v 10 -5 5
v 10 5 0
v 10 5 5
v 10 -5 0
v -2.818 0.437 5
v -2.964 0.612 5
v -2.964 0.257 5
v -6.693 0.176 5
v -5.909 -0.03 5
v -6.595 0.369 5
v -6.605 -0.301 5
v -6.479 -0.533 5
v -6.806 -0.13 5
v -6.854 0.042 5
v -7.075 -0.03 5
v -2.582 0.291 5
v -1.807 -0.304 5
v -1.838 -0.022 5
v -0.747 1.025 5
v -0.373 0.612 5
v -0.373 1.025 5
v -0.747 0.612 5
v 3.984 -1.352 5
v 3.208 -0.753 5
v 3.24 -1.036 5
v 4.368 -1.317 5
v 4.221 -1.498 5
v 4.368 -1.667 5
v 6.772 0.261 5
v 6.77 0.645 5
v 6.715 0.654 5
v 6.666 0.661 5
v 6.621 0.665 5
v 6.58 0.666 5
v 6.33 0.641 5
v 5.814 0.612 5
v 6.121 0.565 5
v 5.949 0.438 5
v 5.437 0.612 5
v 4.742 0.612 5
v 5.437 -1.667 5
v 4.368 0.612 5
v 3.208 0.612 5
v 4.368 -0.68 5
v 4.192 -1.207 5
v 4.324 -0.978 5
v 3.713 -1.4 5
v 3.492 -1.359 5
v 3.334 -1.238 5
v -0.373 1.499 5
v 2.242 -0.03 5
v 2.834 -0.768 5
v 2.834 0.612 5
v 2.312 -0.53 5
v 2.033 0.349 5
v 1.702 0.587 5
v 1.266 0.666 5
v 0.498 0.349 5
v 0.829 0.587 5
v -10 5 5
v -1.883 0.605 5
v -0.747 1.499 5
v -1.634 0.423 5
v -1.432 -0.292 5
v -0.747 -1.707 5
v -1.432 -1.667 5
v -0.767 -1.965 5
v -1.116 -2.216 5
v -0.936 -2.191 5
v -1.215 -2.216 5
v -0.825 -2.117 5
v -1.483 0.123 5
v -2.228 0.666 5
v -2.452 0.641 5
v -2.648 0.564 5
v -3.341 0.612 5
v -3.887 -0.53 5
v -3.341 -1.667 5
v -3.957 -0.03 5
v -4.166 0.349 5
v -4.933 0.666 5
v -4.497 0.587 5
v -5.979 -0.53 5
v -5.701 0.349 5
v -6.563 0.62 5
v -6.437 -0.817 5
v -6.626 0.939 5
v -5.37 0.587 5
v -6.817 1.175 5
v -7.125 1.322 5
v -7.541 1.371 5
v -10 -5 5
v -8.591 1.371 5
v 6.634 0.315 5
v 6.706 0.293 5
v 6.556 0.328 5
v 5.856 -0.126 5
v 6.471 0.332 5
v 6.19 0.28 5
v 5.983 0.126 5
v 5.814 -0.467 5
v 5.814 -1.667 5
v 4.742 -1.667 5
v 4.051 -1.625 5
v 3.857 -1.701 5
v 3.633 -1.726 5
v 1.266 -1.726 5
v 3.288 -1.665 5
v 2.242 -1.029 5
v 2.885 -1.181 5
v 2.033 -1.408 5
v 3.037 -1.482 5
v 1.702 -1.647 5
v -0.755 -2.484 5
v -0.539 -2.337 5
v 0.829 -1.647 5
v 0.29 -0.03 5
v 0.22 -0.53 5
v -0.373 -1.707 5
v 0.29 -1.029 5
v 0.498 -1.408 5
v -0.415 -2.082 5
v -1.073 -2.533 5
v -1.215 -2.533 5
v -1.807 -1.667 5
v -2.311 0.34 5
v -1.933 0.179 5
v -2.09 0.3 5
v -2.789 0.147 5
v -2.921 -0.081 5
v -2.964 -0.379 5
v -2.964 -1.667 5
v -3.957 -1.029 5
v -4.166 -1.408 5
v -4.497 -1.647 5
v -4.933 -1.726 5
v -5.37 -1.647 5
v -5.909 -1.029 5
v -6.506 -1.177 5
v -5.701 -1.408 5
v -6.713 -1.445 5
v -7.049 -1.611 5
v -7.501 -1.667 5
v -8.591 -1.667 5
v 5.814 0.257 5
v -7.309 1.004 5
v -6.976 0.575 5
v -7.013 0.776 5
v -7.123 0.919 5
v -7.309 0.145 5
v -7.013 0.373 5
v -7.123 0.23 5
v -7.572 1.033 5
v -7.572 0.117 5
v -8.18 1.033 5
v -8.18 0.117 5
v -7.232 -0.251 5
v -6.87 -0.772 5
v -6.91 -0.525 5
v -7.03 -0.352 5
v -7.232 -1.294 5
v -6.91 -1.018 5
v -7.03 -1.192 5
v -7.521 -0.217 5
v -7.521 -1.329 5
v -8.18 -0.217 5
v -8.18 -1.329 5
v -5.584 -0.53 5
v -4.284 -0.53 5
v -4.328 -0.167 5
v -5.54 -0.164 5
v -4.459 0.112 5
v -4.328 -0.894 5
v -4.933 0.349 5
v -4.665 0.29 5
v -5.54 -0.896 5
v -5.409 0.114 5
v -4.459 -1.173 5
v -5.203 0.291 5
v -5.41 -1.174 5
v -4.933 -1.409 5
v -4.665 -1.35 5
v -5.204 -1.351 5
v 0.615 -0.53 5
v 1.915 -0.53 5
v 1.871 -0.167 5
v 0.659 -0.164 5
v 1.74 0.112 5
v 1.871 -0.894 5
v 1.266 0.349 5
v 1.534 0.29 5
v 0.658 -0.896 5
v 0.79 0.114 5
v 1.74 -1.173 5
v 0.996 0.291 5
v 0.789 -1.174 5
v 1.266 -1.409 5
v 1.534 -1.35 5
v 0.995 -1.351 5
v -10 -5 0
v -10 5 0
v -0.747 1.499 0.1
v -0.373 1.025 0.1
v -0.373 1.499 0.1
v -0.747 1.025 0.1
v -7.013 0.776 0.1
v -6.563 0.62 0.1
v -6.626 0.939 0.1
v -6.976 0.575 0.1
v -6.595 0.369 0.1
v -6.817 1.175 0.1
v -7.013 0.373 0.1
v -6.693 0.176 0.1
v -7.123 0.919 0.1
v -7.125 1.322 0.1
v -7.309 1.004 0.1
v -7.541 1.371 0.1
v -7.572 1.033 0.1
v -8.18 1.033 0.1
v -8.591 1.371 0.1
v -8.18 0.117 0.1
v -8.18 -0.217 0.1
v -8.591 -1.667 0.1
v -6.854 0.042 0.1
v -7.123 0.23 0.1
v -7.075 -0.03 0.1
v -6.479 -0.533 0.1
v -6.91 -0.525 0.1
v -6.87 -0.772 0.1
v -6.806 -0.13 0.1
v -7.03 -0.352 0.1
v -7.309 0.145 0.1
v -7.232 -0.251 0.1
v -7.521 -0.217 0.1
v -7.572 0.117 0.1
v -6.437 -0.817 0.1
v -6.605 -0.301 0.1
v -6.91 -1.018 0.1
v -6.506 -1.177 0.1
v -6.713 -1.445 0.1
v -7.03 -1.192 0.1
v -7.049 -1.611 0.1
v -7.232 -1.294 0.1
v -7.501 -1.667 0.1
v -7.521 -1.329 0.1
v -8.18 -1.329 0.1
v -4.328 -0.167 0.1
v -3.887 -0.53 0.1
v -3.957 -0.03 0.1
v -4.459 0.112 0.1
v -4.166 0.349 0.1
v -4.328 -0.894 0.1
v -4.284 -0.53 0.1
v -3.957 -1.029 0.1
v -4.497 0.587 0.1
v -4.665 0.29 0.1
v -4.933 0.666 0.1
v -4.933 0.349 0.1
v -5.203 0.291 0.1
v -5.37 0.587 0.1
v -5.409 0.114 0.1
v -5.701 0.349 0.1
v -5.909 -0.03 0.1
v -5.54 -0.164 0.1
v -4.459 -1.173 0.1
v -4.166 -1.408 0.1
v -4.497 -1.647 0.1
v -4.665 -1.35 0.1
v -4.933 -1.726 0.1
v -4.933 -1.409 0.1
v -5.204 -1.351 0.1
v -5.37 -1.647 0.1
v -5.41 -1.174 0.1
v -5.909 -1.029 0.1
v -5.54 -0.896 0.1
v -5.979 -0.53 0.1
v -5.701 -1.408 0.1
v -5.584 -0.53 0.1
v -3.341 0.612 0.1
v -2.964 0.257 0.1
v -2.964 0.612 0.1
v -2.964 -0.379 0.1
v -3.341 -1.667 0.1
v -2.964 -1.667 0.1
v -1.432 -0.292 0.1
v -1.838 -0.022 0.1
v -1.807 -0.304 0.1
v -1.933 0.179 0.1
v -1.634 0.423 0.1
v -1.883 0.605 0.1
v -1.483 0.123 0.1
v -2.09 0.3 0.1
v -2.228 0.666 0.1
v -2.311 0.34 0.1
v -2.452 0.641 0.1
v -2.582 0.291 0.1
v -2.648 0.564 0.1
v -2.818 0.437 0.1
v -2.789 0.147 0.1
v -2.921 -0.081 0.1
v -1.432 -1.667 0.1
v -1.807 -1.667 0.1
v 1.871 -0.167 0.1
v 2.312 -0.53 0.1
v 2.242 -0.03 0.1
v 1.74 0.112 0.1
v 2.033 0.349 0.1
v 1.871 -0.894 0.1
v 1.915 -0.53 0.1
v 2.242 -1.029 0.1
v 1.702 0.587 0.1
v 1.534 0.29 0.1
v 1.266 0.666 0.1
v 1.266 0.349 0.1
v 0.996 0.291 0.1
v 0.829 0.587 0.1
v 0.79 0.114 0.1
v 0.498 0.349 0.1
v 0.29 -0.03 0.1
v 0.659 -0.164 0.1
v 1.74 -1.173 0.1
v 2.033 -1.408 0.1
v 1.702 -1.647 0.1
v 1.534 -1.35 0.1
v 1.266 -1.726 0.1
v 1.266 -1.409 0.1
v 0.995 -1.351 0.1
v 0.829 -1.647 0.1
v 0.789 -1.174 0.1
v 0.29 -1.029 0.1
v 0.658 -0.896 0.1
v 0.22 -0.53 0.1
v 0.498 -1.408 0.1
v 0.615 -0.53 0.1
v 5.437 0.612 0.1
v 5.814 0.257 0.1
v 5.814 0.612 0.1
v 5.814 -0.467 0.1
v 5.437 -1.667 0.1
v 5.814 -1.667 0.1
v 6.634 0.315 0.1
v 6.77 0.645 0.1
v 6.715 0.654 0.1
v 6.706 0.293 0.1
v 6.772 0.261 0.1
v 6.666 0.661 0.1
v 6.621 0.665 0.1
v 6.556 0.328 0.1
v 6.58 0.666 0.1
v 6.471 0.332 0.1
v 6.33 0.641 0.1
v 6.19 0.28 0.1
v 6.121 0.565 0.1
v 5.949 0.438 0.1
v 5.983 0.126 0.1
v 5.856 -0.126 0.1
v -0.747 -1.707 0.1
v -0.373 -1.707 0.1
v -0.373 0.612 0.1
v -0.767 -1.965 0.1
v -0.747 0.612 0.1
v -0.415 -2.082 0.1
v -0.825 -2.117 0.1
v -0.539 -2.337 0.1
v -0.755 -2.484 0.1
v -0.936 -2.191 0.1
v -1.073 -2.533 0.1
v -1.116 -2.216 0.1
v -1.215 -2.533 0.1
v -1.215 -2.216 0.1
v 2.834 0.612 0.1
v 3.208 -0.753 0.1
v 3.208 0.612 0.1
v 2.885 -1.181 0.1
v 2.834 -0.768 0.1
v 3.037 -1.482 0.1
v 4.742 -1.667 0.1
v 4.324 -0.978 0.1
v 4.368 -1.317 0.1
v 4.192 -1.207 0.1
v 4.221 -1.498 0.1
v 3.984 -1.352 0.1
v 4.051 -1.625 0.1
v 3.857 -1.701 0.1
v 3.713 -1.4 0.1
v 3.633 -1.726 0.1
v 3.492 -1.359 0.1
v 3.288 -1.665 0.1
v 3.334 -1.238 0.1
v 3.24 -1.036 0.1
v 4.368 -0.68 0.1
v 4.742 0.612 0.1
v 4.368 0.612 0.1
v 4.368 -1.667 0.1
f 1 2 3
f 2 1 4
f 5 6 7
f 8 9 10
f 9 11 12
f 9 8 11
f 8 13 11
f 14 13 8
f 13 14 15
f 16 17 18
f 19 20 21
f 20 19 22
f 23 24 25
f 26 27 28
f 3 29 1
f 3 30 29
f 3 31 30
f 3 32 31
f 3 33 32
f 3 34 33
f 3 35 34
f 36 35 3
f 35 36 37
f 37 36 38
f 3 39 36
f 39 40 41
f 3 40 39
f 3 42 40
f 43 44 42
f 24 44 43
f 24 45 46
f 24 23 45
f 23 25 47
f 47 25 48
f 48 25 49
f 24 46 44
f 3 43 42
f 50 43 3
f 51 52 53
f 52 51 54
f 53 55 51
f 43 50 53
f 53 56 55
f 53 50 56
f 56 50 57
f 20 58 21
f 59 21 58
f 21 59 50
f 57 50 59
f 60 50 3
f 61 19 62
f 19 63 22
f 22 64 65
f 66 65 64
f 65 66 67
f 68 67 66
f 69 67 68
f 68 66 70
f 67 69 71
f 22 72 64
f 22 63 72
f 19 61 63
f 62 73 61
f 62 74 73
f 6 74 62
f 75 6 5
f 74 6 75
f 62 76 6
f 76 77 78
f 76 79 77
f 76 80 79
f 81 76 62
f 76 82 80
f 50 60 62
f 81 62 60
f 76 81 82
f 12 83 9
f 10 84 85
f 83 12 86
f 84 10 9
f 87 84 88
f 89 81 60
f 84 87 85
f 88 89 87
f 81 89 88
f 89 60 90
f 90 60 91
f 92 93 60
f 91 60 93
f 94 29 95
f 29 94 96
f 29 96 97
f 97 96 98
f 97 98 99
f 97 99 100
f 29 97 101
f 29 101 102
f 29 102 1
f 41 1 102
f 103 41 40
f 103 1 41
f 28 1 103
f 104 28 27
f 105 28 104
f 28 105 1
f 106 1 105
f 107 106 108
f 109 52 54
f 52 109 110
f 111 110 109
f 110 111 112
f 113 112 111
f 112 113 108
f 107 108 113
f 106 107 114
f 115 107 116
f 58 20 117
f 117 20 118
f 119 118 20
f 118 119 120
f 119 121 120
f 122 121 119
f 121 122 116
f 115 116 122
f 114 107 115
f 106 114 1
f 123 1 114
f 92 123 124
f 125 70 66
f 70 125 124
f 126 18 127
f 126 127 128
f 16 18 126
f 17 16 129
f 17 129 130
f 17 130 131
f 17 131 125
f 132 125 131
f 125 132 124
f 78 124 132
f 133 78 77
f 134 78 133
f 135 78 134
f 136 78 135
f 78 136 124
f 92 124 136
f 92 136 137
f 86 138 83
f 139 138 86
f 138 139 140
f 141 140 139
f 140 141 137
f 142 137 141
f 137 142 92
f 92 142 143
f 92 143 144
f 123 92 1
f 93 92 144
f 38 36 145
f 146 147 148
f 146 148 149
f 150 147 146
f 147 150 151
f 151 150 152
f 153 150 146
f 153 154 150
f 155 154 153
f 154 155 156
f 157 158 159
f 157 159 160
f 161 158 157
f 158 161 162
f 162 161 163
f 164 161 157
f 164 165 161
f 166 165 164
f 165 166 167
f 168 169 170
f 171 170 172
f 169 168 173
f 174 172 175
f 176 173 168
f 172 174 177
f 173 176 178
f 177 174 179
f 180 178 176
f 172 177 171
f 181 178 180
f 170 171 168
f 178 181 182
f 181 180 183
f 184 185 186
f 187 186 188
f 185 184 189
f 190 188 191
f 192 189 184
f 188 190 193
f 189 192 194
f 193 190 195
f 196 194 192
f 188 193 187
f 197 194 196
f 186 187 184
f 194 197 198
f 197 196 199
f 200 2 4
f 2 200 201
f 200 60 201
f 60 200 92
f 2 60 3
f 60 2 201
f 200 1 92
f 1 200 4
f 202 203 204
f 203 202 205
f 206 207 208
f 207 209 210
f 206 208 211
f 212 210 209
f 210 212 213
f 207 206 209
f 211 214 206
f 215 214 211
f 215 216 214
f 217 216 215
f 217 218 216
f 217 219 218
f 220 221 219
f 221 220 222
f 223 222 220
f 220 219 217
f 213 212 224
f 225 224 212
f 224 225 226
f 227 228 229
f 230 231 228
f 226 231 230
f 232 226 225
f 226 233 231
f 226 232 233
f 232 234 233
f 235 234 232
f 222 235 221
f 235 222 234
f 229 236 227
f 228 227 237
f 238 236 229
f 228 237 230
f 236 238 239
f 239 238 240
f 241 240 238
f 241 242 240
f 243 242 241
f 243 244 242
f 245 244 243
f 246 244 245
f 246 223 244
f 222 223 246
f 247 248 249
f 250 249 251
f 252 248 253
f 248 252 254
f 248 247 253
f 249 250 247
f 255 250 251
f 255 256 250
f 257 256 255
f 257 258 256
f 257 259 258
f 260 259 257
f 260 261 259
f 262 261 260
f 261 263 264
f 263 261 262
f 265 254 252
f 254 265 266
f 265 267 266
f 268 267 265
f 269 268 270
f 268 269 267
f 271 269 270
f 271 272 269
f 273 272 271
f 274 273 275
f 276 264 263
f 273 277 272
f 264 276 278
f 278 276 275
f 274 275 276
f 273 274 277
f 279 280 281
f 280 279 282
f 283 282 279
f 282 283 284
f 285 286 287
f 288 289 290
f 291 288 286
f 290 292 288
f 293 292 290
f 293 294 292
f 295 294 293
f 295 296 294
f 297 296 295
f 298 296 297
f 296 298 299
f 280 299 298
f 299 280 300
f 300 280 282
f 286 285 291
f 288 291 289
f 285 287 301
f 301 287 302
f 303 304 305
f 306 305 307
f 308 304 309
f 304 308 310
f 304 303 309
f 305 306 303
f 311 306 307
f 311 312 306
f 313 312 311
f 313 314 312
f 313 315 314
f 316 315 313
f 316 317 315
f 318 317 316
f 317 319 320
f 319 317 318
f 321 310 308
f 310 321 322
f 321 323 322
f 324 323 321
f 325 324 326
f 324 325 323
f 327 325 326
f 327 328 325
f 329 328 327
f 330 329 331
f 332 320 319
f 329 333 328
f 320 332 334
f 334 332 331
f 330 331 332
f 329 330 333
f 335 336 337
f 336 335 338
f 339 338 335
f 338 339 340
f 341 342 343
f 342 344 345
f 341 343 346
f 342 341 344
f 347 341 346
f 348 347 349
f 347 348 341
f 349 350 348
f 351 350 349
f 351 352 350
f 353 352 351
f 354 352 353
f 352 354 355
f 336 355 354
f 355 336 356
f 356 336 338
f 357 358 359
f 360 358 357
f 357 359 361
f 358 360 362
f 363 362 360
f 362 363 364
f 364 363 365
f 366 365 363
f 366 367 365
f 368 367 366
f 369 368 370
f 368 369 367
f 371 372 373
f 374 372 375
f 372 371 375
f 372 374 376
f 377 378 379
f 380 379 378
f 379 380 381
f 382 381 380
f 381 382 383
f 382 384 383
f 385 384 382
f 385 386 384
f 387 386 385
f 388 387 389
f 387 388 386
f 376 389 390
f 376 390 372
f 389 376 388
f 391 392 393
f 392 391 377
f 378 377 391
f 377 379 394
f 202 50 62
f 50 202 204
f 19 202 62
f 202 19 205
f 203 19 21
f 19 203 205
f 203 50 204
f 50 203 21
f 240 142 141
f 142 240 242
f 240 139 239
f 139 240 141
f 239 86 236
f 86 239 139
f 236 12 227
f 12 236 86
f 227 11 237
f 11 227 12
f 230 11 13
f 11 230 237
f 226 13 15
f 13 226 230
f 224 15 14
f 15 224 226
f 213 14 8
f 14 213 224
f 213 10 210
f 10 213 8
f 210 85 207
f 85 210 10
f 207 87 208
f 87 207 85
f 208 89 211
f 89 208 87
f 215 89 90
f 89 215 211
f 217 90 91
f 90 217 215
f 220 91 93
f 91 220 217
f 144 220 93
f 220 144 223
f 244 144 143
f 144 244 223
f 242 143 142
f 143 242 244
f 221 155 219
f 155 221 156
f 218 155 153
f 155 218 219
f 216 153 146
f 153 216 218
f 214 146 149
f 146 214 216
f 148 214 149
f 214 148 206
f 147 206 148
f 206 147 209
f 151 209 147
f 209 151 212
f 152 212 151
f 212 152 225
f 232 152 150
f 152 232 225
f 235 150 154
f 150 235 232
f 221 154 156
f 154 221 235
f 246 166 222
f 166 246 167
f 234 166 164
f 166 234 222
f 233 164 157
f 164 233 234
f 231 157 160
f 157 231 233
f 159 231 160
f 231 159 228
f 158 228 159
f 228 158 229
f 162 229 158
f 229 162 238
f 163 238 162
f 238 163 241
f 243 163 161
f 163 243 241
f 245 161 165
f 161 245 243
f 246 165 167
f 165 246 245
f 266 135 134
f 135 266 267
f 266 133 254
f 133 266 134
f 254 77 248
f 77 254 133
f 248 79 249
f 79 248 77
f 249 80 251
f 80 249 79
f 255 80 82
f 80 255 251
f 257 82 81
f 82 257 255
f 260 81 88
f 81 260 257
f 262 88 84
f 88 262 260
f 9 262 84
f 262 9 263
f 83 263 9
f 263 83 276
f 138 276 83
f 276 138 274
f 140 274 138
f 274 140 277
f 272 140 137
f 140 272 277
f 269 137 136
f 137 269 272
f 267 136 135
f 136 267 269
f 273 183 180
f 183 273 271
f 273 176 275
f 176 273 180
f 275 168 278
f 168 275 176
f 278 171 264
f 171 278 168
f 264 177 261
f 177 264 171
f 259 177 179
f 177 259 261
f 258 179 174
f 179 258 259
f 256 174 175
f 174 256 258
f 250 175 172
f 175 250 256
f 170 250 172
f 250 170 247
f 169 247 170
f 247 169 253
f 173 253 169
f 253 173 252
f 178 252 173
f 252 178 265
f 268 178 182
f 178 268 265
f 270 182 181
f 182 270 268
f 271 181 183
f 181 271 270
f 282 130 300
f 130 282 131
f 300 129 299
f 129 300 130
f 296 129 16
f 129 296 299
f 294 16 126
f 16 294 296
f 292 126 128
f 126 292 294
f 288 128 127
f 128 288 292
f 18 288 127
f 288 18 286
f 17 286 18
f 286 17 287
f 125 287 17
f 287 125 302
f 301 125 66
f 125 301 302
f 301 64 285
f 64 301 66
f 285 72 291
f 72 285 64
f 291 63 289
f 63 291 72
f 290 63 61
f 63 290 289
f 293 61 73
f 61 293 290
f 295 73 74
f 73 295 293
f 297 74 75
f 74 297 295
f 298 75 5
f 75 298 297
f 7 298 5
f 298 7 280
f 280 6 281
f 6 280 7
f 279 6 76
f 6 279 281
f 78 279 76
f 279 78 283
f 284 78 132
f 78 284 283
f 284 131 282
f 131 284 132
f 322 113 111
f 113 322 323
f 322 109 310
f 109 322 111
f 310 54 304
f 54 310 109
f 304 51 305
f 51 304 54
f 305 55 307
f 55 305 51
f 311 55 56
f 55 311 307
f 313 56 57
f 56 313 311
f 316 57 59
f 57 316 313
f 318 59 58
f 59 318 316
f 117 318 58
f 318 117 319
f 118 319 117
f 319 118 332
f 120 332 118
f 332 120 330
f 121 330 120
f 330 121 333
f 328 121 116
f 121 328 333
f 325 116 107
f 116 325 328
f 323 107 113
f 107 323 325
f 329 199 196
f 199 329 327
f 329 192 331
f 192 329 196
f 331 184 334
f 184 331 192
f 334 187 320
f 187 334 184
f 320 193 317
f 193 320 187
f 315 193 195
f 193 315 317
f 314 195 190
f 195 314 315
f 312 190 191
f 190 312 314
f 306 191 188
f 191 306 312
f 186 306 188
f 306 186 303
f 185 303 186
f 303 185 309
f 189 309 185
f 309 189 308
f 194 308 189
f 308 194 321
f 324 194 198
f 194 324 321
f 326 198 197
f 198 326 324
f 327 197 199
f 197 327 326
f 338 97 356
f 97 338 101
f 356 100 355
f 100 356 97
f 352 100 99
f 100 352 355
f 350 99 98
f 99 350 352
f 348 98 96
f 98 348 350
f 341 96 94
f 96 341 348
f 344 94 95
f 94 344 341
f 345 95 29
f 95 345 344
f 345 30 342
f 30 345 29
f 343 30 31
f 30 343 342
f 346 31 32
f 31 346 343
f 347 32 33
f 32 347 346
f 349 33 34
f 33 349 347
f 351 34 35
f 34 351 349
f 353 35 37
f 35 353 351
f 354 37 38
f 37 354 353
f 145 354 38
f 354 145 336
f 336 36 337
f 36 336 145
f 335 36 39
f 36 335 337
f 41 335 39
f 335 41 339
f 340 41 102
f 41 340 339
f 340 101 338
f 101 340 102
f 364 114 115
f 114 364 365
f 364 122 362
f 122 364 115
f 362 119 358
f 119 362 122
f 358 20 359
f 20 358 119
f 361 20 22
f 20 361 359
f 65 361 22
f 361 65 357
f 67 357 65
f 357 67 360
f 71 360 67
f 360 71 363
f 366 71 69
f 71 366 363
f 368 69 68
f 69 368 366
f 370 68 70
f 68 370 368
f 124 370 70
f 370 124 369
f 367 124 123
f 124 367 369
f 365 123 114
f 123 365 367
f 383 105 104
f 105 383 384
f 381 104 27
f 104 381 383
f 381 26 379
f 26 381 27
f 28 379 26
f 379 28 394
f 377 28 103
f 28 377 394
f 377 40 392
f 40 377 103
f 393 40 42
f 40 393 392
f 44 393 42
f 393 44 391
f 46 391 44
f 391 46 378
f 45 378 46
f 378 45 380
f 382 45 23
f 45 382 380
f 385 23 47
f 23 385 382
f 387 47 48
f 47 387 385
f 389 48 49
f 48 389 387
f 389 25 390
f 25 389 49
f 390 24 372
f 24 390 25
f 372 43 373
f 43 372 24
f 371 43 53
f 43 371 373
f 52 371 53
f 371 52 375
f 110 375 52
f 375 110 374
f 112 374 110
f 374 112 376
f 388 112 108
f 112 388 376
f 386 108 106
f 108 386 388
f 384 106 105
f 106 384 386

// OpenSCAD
$fn = 10; 
texte_a_inserer = "Bonjour"; 
taille = 3; 
police = "DejaVuSans"; //[[Abril Fatface,Aclonica,Acme,Advent Pro,Akronim,Aladin,Alegreya,Alegreya Sans,Alegreya SC,Alex Brush,Alfa Slab One,Alice,Amaranth,Architects Daughter,Archivo Black,Archivo Narrow,Arimo,Arvo,Asap,Astloch,Asul,Averia Libre,Averia Serif Libre,Bangers,Basic,Belgrano,Berkshire Swash,Bigshot One,Bilbo Swash Caps,Black Ops One,Bonbon,Bowlby One SC,Brawler,Bubblegum Sans,Butterfly Kids,Cabin Condensed,Caesar Dressing,Cagliostro,Calligraffitti,Capriola,Carter One,Changa One,Chango,Chelsea Market,Cherry Cream Soda,Chewy,Chicle,Chivo,Clicker Script,Coming Soon,Concert One,Condiment,Cookie,Courgette,Covered By Your Grace,Crimson Text,Dancing Script,DejaVu Sans,DejaVu Serif,Dhurjati,Doppio One,Dosis,Droid Sans,Eagle Lake,Electrolize,Emilys Candy,Encode Sans,Encode Sans Compressed,Euphoria Script,Exo,Exo 2,Faster One,Federo,Finger Paint,Fjord One,Fontdiner Swanky,Freckle Face,Fruktur,Gabriela,Geo,Germania One,Give You Glory,Gloria Hallelujah,Goudy Bookletter 1911,Graduate,Grand Hotel,Great Vibes,Griffy,Hanalei Fill,Happy Monkey,Henny Penny,Hind,IM Fell English SC,Indie Flower,Irish Grover,Italianno,Jacques Francois Shadow,Jolly Lodger,Josefin Slab,Joti One,Judson,Just Another Hand,Kalam,Kameron,Karma,Kavoon,Knewave,Kranky,Kristi,Laila,Lakki Reddy,Lancelot,Lato,Leckerli One,Ledger,Lekton,Lemon One,Liberation Sans,Libre Caslon Text,Life Savers,Lilita One,Lily Script One,Limelight,Lobster,Lobster Two,Londrina Outline,Londrina Shadow,Londrina Solid,Lora,Love Ya Like A Sister,Loved by the King,Lovers Quarrel,Luckiest Guy,Lusitana,Macondo,Macondo Swash Caps,Mako,Marck Script,Margarine,Marko One,Maven Pro,McLaren,MedievalSharp,Merienda One,Merriweather,Mervale Script,Metal Mania,Metrophobic,Milonga,Miltonian Tattoo,Miss Fajardose,Molle,Montez,Montserrat,Mr De Haviland,Mystery Quest,Neucha,New Rocker,Niconne,Nosifer,Nothing You Could Do,Noto Sans Oriya,Noto Serif,Nova Square,Nunito,Old Standard TT,Oleo Script,Oleo Script Swash Caps,Orbitron,Oregano,Orienta,Original Surfer,Oswald,Over the Rainbow,Overlock,Oxygen,Pacifico,Paprika,Parisienne,Patrick Hand SC,Paytone One,Peralta,Permanent Marker,Piedra,Pirata One,Play,Playball,Poetsen One,Poppins,Press Start 2P,Princess Sofia,PT Mono,Qwigley,Racing Sans One,Raleway,Rancho,Ranga,Ribeye,Roboto,Roboto Condensed,Roboto Slab,Rochester,Rock Salt,Rubik One,Sail,Salsa,Sansita One,Sarina,Satisfy,Schoolbell,Seaweed Script,Sevillana,Shadows Into Light,Shadows Into Light Two,Share,Six Caps,Skranji,Source Sans Pro,Spicy Rice,Stardos Stencil,Stoke,Syncopate,Teko,Terminal Dosis,The Girl Next Door,Tillana,Timmana,Titillium Web,Ubuntu,Ultra,Underdog,UnifrakturCook,UnifrakturMaguntia,Vampiro One,Vidaloka,Viga,Voces,Volkhov,Vollkorn,Voltaire,Waiting for the Sunrise,Wallpoet,Wellfleet,Wendy One,Yellowtail,Yesteryear,Zeyada]]
hauteur = 5; 
longueur_cube = 20; 
largeur_cube = 10; 
hauteur_cube = 5; 
// relief = true  extrusion = false
relief = "true"; //[true,false]
module rendu(){
linear_extrude(hauteur) text(texte_a_inserer,size = taille, font = police);
}
module finao(){
if ( relief== true) {
   union(){
 translate([0,0,0])   cube([longueur_cube,largeur_cube,hauteur_cube]);
translate([1,(largeur_cube/3),hauteur_cube]) rendu();
   } 
}
else
{
difference(){
 translate([0,0,0])   cube([longueur_cube,largeur_cube,hauteur_cube]);
translate([1,(largeur_cube/3),(hauteur_cube -hauteur+0.1)]) rendu();
}
 }
}
translate ([-(longueur_cube/2),-(largeur_cube/2),0]) finao();
